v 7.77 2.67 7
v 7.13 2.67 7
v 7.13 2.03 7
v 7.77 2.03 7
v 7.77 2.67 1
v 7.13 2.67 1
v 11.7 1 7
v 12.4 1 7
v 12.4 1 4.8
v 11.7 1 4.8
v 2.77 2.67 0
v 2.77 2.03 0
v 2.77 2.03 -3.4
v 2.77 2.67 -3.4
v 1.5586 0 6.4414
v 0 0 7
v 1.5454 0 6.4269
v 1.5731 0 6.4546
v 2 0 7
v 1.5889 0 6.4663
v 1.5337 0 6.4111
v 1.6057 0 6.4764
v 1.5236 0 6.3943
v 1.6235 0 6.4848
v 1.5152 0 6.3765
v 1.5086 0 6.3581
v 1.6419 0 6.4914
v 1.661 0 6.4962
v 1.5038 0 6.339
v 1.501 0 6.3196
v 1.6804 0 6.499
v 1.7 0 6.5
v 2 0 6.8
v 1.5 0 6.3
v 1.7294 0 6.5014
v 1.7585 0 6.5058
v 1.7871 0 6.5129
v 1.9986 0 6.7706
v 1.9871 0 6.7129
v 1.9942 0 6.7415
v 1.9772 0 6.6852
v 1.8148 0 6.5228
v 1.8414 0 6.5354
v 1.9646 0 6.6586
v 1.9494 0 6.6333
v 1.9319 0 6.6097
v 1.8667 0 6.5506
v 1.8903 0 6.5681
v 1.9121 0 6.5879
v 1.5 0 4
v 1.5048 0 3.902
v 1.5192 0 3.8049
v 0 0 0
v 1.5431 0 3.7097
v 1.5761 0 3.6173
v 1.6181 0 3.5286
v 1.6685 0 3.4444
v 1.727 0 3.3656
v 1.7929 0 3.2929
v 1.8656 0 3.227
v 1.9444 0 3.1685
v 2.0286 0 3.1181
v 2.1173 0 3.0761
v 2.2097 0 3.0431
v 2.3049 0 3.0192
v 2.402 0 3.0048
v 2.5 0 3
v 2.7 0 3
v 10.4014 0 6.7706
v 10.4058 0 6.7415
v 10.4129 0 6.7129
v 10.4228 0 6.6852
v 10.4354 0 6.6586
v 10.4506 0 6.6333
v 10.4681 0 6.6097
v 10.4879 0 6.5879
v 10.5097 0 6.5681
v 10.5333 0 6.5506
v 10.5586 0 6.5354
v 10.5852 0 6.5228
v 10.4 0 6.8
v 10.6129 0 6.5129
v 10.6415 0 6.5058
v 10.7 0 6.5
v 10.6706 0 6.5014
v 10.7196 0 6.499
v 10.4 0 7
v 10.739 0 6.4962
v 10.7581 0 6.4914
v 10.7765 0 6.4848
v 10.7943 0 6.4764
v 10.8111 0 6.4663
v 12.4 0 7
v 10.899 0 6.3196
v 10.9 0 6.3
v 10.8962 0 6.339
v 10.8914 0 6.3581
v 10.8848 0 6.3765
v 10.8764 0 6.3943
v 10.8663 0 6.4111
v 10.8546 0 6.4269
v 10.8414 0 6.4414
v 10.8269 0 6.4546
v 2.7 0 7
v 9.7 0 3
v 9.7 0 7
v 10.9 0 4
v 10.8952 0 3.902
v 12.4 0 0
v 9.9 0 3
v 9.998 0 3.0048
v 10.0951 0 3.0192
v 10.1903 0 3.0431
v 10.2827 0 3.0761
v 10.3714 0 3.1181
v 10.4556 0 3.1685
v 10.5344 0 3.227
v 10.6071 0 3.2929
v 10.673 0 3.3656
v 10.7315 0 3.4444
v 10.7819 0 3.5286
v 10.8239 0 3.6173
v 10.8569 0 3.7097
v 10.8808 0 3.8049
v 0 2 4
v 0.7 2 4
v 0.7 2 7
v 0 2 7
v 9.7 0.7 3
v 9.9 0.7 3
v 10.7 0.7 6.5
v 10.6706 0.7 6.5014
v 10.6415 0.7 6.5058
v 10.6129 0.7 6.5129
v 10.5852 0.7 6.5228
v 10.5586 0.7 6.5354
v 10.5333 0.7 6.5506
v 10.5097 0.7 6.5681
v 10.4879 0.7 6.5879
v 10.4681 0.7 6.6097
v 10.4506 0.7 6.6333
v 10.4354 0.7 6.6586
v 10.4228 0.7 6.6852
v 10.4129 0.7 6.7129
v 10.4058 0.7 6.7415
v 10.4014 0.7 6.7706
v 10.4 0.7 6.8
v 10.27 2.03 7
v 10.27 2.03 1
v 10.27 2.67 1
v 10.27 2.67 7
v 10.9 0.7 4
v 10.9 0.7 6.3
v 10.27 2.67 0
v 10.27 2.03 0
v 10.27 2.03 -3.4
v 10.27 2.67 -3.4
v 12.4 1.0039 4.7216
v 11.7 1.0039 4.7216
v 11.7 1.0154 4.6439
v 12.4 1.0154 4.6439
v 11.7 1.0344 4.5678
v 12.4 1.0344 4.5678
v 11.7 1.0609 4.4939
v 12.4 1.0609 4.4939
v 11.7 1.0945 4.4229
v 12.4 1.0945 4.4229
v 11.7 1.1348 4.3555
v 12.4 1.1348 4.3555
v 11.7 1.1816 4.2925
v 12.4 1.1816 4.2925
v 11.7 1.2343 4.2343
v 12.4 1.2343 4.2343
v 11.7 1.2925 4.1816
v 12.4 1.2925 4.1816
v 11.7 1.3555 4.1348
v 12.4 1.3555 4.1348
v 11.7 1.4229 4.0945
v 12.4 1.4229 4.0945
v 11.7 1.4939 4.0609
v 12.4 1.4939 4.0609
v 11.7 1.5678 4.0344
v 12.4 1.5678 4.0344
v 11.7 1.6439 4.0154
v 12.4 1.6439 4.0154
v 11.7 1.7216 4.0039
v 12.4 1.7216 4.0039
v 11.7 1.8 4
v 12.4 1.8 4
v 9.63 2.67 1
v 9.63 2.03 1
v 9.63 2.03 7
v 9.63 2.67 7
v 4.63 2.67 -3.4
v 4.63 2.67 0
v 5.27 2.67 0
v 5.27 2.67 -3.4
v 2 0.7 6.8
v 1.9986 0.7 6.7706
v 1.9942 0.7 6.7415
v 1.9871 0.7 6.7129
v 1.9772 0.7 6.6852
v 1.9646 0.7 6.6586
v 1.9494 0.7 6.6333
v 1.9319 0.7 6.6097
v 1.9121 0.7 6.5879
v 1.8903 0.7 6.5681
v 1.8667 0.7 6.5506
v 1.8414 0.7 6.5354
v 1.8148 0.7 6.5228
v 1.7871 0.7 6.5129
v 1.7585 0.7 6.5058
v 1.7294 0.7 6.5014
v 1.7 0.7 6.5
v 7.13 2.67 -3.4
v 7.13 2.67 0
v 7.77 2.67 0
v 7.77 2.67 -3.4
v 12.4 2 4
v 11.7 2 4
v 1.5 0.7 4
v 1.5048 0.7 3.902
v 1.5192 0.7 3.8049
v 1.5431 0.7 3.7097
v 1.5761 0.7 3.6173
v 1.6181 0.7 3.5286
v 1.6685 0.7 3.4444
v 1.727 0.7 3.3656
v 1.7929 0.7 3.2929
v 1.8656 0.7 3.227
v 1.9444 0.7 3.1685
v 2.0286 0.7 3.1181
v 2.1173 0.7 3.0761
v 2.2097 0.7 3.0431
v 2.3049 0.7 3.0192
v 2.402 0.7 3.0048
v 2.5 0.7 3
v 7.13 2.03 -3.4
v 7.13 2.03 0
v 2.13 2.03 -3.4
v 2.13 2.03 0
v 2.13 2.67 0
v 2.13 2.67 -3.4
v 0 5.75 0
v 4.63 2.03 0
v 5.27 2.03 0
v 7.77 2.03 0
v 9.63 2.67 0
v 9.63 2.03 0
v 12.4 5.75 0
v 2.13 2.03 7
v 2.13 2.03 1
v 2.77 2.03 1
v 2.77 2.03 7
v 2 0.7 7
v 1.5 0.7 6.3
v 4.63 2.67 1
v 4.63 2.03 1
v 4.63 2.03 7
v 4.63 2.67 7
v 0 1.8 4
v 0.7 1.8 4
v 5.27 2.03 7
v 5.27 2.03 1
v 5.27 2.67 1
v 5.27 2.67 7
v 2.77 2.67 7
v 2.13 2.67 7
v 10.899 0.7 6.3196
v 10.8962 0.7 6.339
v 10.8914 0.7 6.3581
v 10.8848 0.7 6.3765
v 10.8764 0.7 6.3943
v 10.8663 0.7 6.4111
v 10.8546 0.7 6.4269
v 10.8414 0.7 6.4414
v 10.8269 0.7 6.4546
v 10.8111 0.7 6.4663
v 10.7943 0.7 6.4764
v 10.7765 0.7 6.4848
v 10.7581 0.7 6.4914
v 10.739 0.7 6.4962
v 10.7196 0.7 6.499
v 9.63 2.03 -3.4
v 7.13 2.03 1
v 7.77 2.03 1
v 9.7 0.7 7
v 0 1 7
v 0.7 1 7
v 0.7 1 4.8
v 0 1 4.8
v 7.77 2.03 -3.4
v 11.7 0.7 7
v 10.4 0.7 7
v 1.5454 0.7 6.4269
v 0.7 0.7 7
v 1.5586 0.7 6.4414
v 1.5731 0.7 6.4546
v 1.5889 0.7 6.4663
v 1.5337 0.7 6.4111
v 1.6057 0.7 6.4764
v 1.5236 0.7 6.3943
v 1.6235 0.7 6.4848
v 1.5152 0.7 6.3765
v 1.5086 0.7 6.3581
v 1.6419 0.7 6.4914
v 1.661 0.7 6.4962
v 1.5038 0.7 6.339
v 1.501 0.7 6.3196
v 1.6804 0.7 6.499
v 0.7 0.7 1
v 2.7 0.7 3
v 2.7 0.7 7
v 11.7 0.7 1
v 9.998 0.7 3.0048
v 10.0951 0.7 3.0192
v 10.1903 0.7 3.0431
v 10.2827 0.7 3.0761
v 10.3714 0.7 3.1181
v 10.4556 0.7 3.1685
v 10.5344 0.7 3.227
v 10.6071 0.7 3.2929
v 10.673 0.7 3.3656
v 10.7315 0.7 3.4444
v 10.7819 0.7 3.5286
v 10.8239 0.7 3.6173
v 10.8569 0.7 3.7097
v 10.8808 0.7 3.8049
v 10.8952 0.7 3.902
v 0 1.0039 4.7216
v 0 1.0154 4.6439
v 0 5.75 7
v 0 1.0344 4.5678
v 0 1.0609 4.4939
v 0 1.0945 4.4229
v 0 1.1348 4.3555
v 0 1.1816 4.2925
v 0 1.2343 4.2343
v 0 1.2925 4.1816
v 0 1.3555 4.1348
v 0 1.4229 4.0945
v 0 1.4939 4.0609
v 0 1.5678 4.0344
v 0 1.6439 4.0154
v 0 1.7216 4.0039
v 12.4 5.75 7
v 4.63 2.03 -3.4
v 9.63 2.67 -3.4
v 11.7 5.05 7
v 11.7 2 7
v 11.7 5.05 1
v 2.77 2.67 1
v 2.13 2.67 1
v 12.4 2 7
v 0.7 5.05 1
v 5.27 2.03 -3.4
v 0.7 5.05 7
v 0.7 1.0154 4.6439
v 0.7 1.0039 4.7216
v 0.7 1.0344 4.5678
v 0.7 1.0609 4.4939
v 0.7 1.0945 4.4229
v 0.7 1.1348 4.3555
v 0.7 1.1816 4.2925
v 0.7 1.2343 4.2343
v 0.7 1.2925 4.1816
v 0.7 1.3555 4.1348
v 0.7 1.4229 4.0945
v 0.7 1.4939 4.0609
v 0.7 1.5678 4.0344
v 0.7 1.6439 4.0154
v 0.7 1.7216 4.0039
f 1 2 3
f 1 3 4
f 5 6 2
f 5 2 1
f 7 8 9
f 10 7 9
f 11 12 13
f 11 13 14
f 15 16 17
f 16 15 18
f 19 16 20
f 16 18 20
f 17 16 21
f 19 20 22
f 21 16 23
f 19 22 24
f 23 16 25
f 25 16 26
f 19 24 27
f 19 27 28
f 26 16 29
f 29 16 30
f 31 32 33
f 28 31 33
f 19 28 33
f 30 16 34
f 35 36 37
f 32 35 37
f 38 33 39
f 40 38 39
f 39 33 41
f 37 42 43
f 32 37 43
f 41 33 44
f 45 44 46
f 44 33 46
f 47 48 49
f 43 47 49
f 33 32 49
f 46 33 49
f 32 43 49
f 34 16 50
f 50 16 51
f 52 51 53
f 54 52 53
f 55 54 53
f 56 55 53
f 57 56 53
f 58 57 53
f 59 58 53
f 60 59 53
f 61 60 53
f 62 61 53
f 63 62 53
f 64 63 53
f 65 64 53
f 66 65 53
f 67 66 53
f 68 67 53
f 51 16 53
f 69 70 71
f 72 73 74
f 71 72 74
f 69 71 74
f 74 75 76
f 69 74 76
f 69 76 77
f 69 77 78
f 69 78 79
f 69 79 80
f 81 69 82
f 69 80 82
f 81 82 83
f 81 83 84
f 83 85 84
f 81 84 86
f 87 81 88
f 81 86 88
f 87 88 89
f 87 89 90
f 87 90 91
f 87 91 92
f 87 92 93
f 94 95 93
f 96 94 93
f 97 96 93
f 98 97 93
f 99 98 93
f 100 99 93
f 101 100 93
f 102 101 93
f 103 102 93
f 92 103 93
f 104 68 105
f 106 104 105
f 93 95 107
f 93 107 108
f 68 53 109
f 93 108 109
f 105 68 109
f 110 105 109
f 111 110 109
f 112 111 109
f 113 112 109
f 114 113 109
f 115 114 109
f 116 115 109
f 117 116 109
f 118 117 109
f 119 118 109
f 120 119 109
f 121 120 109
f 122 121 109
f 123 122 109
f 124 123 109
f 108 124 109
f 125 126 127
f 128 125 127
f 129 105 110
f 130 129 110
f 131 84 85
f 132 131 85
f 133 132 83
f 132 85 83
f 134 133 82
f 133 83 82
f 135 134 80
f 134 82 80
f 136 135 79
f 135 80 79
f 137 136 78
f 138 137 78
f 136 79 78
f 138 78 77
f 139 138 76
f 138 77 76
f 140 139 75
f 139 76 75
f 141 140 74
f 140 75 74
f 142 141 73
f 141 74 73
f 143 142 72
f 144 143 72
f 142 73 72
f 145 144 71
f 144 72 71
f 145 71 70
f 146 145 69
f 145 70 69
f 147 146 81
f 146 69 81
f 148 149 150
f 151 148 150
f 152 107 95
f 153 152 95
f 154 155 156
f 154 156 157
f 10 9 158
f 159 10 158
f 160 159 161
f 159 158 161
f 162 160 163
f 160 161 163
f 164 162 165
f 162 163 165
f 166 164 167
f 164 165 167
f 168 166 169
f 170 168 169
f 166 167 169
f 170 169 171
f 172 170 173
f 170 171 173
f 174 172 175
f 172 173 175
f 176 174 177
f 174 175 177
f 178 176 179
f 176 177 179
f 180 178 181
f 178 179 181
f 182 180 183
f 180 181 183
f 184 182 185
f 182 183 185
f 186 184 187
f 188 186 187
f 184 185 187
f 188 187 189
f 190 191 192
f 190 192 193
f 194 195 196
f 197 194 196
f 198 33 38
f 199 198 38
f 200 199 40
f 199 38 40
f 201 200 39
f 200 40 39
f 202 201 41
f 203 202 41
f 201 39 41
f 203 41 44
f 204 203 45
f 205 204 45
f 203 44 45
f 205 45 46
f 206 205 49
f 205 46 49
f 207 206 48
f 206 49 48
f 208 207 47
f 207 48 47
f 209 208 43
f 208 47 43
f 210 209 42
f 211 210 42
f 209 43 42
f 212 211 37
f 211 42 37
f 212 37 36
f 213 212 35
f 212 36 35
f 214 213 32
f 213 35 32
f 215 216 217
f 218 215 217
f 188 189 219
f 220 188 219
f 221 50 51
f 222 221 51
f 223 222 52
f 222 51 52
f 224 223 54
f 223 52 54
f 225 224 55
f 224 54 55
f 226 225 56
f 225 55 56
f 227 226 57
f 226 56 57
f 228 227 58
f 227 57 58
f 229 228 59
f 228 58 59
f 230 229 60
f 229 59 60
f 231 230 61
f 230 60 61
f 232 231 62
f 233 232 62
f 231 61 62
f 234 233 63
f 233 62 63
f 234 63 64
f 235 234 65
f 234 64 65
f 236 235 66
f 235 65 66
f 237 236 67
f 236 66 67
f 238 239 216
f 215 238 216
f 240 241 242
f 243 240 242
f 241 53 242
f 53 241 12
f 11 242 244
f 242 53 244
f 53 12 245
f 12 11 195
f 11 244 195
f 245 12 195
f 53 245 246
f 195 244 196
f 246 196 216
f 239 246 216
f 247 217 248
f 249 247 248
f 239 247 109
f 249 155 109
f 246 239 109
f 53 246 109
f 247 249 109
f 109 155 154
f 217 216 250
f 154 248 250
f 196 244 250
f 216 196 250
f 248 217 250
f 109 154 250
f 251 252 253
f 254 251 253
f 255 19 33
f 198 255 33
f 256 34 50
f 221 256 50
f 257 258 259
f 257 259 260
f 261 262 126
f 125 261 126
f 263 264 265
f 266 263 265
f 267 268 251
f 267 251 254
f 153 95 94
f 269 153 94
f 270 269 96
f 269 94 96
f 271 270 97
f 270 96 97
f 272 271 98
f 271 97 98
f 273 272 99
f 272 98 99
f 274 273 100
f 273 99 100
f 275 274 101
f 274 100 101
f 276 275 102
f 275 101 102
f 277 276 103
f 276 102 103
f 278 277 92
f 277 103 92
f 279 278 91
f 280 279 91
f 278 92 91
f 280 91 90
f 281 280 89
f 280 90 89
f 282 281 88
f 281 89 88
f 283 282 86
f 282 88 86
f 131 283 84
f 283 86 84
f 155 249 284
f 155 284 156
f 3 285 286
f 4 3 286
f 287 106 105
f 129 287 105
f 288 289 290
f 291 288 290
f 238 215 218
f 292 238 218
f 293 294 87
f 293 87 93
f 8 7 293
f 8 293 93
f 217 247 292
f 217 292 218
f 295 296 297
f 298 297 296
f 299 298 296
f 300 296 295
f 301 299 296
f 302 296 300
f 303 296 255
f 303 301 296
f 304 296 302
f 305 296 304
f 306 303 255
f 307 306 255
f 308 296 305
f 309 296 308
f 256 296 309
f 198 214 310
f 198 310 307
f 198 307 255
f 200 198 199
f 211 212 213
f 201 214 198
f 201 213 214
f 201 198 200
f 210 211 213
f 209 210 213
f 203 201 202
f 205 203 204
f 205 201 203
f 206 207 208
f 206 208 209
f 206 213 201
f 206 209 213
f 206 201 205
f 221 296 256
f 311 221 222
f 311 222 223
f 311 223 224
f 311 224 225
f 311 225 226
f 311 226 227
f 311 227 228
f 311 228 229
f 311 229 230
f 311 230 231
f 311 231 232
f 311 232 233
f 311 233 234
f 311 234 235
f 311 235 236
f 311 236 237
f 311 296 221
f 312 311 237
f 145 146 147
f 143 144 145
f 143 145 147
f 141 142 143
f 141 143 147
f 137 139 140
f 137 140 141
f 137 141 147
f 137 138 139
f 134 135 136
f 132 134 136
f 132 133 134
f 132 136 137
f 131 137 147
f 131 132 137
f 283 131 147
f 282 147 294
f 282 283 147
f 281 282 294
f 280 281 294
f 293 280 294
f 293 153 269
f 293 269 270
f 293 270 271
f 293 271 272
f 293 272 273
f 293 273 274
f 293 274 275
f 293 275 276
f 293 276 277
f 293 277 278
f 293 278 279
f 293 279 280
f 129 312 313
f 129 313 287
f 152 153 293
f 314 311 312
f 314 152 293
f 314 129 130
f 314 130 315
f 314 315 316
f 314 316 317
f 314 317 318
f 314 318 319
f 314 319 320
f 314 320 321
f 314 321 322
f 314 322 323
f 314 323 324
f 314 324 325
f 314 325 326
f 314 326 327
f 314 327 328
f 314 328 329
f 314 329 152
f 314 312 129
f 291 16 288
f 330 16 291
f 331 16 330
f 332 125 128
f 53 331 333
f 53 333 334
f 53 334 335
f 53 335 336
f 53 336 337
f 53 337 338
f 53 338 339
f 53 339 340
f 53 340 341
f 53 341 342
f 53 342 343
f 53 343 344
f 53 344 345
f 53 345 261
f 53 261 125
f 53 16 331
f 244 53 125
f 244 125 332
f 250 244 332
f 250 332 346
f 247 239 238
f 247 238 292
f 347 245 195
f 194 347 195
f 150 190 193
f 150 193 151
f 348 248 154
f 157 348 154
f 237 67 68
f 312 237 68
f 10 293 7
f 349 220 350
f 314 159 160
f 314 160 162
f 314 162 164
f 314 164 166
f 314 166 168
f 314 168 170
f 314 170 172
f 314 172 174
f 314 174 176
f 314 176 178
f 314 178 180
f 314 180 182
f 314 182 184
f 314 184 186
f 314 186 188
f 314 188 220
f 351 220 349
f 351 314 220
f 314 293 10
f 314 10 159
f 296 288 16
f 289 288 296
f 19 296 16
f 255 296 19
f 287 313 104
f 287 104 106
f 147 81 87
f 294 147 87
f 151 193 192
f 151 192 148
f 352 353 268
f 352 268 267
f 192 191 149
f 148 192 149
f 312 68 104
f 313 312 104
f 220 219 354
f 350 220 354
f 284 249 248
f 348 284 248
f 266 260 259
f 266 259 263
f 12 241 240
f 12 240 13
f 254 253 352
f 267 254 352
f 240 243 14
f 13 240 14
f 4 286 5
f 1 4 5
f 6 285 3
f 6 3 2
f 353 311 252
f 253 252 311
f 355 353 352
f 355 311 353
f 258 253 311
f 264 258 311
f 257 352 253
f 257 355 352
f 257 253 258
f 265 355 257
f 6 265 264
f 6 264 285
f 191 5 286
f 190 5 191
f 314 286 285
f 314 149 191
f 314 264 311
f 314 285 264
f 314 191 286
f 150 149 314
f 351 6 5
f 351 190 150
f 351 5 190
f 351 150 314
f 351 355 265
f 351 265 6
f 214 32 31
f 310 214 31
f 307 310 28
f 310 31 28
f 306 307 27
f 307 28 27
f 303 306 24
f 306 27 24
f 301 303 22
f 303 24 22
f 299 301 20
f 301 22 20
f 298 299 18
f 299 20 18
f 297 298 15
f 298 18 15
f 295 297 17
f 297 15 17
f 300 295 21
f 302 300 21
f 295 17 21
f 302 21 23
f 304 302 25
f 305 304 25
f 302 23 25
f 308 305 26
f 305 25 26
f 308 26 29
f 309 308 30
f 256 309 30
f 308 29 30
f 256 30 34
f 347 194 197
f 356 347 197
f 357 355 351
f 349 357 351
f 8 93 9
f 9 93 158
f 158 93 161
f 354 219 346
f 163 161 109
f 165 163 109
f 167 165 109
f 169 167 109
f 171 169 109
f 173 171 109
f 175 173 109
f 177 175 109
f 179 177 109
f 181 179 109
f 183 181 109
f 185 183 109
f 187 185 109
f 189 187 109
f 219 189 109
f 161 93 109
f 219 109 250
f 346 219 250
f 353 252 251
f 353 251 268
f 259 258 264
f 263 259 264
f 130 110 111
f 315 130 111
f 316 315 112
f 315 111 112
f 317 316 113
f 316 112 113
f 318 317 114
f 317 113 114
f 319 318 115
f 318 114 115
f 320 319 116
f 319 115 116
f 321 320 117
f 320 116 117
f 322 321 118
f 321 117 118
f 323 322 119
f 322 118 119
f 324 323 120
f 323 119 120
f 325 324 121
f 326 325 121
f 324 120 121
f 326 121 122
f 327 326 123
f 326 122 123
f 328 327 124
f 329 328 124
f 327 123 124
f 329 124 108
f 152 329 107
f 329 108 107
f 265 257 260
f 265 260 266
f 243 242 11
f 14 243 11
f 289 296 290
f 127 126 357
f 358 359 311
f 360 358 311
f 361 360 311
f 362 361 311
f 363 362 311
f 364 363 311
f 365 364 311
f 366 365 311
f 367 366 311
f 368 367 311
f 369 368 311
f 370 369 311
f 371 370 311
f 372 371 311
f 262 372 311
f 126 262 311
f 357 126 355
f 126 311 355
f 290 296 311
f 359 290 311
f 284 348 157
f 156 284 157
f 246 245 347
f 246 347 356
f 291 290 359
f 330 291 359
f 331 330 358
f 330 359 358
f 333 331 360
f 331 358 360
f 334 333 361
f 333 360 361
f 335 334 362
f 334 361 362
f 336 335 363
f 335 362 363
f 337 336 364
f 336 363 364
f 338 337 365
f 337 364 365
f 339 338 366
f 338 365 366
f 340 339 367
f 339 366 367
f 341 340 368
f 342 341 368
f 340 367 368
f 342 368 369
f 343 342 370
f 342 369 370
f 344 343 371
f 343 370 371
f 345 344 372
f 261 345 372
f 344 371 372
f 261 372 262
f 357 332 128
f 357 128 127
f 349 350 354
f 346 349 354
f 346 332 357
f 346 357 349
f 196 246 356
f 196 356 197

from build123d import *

# Parameters (mm, degrees)
F0_W          = 12.4
F0_H          = 5.75
F0_W_2        = 11
F0_H_2        = 4.35
F0_W_3        = 0.64
F0_H_3        = 0.64
F1_DEPTH      = 1
F2_DEPTH      = 7
F4_DEPTH      = 12.5
F6_DEPTH      = 0.7
F7_DEPTH      = 7
F7_DEPTH_BACK = 3.4


with BuildPart() as f1:
    # F0 (on Top) → F1 (new body)
    with BuildSketch(Plane.XY):
        with Locations((6.2, 2.875)):
            Rectangle(F0_W, F0_H)
        with Locations((6.2, 2.875)):
            Rectangle(F0_W_2, F0_H_2, mode=Mode.SUBTRACT)
        with Locations((6.2, 2.875)):
            Rectangle(F0_W_2, F0_H_2)
        with Locations((2.45, 2.35)):
            Rectangle(F0_W_3, F0_H_3, mode=Mode.SUBTRACT)
        with Locations((4.95, 2.35)):
            Rectangle(F0_W_3, F0_H_3, mode=Mode.SUBTRACT)
        with Locations((7.45, 2.35)):
            Rectangle(F0_W_3, F0_H_3, mode=Mode.SUBTRACT)
        with Locations((9.95, 2.35)):
            Rectangle(F0_W_3, F0_H_3, mode=Mode.SUBTRACT)
    extrude(amount=F1_DEPTH)

    # F0 (on Top) → F2 (join)
    with BuildSketch(Plane.XY):
        with Locations((6.2, 2.875)):
            Rectangle(F0_W, F0_H)
        with Locations((6.2, 2.875)):
            Rectangle(F0_W_2, F0_H_2, mode=Mode.SUBTRACT)
    extrude(amount=F2_DEPTH)

    # F3 (on face) → F4 (cut)
    with BuildSketch(Plane.YZ.offset(12.4)):
        with BuildLine():
            Line((2, 7), (1, 7))
            Line((1, 7), (1, 4.8))
            ThreePointArc((1, 4.8), (1.2343145751, 4.2343145751), (1.8, 4))
            Line((1.8, 4), (2, 4))
            Line((2, 4), (2, 7))
        make_face()
    extrude(amount=-F4_DEPTH, mode=Mode.SUBTRACT)

    # F5 (on face) → F6 (cut)
    with BuildSketch(Plane.XZ):
        with BuildLine():
            Line((2.7, 3), (2.7, 7))
            Line((2.7, 7), (2, 7))
            Line((2, 7), (2, 6.8))
            ThreePointArc((2, 6.8), (1.9121320344, 6.5878679656), (1.7, 6.5))
            ThreePointArc((1.7, 6.5), (1.5585786438, 6.4414213562), (1.5, 6.3))
            Line((1.5, 6.3), (1.5, 4))
            ThreePointArc((1.5, 4), (1.7928932188, 3.2928932188), (2.5, 3))
            Line((2.5, 3), (2.7, 3))
        make_face()
        with BuildLine():
            Line((10.4, 7), (9.7, 7))
            Line((9.7, 7), (9.7, 3))
            Line((9.7, 3), (9.9, 3))
            ThreePointArc((9.9, 3), (10.6071067812, 3.2928932188), (10.9, 4))
            Line((10.9, 4), (10.9, 6.3))
            ThreePointArc((10.9, 6.3), (10.8414213562, 6.4414213562), (10.7, 6.5))
            ThreePointArc((10.7, 6.5), (10.4878679656, 6.5878679656), (10.4, 6.8))
            Line((10.4, 6.8), (10.4, 7))
        make_face()
    extrude(amount=-F6_DEPTH, mode=Mode.SUBTRACT)

    # F0 (on Top) → F7 (join, two sides)
    with BuildSketch(Plane.XY) as f7_sk:
        with Locations((2.45, 2.35)):
            Rectangle(F0_W_3, F0_H_3)
        with Locations((4.95, 2.35)):
            Rectangle(F0_W_3, F0_H_3)
        with Locations((7.45, 2.35)):
            Rectangle(F0_W_3, F0_H_3)
        with Locations((9.95, 2.35)):
            Rectangle(F0_W_3, F0_H_3)
    extrude(amount=F7_DEPTH)
    extrude(f7_sk.sketch, amount=-F7_DEPTH_BACK)


solid = f1.part
